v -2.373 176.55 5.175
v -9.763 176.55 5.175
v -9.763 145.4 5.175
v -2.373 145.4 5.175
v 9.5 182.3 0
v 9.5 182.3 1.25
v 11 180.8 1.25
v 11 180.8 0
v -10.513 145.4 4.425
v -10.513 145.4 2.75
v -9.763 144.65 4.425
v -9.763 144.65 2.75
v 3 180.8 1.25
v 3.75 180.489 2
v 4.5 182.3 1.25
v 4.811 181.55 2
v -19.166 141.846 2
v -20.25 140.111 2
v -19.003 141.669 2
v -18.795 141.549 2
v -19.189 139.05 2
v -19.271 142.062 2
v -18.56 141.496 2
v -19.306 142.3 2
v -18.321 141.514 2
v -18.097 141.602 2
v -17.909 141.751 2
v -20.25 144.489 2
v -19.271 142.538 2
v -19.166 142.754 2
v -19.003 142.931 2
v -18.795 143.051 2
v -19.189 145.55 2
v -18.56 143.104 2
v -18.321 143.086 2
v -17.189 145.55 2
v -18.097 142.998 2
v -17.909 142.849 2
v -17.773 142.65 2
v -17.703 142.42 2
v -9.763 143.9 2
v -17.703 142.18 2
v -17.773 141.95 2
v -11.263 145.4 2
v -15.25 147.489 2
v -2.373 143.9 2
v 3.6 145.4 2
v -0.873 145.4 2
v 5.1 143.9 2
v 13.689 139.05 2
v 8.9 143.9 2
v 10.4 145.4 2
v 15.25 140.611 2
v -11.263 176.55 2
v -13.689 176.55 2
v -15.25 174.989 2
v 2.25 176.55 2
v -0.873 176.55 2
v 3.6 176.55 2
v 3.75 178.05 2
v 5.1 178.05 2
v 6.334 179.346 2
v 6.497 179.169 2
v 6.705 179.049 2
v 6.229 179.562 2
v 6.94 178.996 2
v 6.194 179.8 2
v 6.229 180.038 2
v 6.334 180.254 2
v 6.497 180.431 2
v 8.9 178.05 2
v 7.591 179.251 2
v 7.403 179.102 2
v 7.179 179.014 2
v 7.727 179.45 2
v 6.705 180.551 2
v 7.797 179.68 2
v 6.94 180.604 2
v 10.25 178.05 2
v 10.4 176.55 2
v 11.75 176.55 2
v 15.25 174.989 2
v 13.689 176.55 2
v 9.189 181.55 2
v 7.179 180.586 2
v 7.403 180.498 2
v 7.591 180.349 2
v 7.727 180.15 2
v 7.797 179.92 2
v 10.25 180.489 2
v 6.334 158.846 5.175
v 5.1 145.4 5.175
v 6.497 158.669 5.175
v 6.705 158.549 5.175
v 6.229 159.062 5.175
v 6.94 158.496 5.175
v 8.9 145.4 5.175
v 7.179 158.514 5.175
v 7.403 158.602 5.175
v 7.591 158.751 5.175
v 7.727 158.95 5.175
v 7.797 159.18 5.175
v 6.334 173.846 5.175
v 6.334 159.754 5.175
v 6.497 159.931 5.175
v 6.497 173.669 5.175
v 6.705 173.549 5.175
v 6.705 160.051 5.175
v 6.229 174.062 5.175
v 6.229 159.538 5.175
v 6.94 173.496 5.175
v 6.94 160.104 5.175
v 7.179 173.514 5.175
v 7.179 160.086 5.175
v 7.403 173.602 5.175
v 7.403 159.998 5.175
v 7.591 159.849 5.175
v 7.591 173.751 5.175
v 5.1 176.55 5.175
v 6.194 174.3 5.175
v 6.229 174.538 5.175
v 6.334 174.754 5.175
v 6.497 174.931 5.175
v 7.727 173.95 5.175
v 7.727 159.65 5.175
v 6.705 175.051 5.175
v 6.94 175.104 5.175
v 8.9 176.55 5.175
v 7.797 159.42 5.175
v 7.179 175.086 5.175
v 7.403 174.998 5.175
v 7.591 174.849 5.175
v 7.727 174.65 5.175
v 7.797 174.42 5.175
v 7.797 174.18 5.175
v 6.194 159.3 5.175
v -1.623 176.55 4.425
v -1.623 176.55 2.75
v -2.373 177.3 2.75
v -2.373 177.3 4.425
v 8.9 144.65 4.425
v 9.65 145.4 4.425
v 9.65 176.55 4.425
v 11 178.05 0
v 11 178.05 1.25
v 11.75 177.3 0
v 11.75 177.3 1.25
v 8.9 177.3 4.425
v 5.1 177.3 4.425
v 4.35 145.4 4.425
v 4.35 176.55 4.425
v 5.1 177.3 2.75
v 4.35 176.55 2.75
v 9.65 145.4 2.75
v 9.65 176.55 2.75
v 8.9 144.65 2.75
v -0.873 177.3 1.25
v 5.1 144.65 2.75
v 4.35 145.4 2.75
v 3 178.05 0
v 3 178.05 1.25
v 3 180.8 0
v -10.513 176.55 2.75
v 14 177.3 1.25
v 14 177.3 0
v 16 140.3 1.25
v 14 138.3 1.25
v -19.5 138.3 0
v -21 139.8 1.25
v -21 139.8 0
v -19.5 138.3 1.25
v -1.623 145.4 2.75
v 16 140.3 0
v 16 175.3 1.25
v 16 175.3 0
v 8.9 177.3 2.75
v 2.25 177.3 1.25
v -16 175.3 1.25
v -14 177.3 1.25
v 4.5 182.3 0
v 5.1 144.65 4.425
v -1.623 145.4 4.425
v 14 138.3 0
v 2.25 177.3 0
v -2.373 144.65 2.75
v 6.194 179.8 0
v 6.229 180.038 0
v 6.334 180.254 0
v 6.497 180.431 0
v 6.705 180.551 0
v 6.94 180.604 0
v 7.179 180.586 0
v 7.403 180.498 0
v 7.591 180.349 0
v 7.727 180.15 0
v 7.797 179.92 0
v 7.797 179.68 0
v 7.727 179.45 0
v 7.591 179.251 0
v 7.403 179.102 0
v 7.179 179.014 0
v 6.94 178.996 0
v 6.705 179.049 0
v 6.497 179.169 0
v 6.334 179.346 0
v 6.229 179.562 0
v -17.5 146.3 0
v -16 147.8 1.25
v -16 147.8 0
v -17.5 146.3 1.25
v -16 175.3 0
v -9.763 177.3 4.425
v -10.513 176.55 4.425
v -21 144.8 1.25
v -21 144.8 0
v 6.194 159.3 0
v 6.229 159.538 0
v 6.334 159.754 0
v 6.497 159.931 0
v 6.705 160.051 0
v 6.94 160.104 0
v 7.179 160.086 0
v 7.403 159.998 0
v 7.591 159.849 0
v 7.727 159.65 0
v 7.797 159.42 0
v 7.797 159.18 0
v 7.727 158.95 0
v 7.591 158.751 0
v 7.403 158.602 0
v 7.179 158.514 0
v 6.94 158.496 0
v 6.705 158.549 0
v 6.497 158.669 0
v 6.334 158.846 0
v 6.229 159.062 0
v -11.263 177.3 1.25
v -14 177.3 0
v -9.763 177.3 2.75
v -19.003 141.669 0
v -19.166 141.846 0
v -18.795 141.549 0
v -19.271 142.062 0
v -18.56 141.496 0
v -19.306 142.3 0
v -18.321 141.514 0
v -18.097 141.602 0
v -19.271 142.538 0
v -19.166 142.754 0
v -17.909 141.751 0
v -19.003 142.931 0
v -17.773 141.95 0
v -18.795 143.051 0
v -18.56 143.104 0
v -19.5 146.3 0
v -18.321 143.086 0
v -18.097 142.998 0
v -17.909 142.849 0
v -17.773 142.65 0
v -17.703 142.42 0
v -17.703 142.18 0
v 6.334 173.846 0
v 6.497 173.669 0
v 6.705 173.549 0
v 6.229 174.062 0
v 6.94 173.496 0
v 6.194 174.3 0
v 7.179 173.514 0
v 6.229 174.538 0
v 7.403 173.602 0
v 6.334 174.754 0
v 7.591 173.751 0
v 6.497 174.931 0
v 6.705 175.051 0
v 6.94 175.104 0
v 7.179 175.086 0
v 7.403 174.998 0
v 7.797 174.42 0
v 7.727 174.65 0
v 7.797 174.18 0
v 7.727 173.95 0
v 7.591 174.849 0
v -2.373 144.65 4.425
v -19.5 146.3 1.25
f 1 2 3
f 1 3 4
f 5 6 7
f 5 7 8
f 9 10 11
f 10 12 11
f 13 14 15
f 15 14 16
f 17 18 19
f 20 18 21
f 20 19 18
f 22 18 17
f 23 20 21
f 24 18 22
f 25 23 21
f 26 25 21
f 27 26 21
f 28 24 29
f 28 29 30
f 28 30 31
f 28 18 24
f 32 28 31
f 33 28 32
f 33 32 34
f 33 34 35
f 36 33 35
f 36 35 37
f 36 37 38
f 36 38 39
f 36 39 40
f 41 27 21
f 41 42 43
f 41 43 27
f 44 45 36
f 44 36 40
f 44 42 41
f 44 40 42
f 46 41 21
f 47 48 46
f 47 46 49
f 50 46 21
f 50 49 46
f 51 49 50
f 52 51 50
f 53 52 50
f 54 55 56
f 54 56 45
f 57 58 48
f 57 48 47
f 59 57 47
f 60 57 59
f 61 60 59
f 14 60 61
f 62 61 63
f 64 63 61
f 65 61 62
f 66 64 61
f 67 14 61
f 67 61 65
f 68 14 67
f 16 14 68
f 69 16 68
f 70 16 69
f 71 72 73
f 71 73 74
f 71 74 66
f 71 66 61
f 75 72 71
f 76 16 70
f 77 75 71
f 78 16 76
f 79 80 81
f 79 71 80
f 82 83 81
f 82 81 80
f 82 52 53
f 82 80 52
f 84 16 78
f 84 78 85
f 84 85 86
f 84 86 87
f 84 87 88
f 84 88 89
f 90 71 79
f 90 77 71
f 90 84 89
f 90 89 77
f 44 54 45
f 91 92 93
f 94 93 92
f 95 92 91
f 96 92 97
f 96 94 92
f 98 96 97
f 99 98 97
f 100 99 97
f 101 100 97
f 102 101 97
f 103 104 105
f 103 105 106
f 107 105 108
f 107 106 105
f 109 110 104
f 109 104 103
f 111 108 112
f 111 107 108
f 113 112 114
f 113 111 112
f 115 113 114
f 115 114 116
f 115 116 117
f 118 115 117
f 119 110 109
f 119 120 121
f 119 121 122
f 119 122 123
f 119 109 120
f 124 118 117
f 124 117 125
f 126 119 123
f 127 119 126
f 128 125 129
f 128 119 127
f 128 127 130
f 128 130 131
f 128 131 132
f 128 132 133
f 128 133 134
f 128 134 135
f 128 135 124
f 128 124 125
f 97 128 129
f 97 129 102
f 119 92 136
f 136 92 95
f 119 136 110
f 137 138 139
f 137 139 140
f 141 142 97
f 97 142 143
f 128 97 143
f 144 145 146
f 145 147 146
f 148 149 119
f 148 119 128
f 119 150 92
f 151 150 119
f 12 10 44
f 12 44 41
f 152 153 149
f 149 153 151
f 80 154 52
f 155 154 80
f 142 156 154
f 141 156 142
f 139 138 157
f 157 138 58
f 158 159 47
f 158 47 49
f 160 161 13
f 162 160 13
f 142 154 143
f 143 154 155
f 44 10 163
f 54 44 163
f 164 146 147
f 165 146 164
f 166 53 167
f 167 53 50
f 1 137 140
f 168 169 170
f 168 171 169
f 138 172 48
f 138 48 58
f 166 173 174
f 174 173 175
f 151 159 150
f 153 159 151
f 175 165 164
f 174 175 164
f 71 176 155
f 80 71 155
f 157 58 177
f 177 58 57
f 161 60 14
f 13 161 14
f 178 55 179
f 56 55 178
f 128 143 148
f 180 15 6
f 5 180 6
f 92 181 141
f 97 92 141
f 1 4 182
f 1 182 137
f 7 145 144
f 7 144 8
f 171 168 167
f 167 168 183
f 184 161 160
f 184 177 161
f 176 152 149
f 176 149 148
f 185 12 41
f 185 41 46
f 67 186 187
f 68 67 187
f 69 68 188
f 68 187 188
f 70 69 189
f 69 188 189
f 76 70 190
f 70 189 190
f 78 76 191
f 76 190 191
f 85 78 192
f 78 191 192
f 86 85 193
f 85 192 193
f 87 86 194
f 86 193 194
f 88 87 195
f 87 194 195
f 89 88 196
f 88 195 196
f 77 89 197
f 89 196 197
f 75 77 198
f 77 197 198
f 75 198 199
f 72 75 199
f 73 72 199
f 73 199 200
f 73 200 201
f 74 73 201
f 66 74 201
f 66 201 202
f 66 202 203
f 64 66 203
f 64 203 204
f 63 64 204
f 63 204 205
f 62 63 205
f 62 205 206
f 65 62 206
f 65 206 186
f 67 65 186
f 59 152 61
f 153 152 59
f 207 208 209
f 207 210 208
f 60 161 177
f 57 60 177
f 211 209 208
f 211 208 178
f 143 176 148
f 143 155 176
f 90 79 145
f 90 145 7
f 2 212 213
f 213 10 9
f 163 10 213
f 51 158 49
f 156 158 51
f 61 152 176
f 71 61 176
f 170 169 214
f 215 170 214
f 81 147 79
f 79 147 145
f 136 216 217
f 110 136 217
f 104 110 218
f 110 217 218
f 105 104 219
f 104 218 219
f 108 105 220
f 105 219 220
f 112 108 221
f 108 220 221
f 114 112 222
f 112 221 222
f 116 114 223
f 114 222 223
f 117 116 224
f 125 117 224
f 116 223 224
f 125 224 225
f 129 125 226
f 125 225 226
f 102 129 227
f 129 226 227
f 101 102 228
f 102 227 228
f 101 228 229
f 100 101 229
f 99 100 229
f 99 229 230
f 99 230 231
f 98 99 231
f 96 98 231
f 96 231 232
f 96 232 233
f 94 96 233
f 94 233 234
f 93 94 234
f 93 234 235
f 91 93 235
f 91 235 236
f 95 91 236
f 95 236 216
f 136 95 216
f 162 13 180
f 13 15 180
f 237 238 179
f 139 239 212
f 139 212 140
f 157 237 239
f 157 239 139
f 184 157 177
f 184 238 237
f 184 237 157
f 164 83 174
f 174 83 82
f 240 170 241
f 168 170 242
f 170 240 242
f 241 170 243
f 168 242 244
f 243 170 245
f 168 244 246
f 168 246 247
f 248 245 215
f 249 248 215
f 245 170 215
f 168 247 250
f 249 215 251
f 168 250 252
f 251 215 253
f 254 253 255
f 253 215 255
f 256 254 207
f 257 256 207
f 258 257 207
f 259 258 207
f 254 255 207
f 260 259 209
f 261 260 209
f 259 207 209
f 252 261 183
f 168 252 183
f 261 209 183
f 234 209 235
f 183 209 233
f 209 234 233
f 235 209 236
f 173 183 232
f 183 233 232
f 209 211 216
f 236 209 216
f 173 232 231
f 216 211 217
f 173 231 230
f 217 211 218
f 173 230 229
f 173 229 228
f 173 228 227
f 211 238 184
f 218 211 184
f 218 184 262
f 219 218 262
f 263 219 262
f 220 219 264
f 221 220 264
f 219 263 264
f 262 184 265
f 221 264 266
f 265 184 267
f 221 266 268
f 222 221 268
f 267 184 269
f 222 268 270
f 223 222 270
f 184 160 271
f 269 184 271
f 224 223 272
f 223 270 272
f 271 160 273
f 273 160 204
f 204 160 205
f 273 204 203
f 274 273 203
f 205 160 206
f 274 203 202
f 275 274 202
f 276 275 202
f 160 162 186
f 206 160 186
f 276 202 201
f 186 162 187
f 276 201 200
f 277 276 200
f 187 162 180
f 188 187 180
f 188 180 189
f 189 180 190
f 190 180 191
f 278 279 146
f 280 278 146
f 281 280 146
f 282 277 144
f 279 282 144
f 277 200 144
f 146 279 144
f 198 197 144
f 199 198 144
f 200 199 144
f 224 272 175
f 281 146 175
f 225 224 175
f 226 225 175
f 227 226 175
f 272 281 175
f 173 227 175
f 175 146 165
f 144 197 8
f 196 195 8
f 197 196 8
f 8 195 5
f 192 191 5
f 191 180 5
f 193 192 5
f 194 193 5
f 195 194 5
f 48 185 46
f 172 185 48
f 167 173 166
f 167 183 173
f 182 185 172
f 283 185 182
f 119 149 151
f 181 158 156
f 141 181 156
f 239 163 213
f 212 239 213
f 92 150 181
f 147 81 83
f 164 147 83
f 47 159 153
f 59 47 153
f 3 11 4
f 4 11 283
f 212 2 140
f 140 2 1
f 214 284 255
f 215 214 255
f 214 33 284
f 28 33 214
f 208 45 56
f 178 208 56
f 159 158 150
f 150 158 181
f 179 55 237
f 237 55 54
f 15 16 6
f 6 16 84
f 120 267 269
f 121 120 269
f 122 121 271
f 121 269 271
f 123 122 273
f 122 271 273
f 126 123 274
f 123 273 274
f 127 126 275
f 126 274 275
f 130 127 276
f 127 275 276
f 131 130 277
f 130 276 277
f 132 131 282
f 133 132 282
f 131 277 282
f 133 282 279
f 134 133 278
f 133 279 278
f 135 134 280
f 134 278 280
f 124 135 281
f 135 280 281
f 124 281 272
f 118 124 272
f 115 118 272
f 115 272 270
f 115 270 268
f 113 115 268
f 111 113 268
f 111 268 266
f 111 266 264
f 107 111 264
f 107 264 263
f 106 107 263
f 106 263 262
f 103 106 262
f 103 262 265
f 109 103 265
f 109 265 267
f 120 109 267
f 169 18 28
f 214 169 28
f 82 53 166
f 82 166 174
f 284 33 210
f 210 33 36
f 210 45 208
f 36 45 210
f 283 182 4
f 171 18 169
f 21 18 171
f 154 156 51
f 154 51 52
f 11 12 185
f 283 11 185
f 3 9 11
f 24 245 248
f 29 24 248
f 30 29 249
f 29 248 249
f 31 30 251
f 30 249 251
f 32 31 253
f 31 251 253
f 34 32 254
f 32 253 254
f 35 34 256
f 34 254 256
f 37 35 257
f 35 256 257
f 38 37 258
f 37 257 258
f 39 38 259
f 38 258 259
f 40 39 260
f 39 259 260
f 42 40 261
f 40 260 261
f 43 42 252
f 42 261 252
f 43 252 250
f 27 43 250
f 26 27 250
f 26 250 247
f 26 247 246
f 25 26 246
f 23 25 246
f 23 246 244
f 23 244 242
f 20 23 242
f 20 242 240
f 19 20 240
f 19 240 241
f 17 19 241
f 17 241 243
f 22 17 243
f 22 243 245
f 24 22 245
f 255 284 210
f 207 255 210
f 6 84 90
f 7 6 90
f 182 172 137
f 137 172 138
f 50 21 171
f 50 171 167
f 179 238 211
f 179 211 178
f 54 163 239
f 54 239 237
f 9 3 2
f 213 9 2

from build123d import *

# Parameters (mm, degrees)
SKETCH1_W                    = 32
SKETCH1_H                    = 39
BOSS_EXTRUDE1_DEPTH          = 2
SKETCH2_W                    = 5.3
SKETCH2_H                    = 32.65
SKETCH2_W_2                  = 8.89
BOSS_EXTRUDE2_DEPTH          = 3.175
SKETCH10_W                   = 8
SKETCH10_H                   = 5
SKETCH10_W_2                 = 5
SKETCH10_H_2                 = 8
BOSS_EXTRUDE3_DEPTH          = 2
F_52_0_0635_DIAMETER_HOLE1_D = 1.6129
CHAMFER1_SIZE                = 2
CHAMFER3_SIZE                = 1.5
CHAMFER2_SIZE                = 0.75


with BuildPart() as part:
    # Sketch1 → Boss-Extrude1 (new body)
    with BuildSketch(Plane.XY):
        with Locations((0, 157.8)):
            Rectangle(SKETCH1_W, SKETCH1_H)
    extrude(amount=BOSS_EXTRUDE1_DEPTH)

    # Sketch2 → Boss-Extrude2 (add)
    with BuildSketch(Plane.XY.offset(2)):
        with Locations((7, 160.975)):
            Rectangle(SKETCH2_W, SKETCH2_H)
        with Locations((-6.068, 160.975)):
            Rectangle(SKETCH2_W_2, SKETCH2_H)
    extrude(amount=BOSS_EXTRUDE2_DEPTH)

    # Sketch10 → Boss-Extrude3 (add)
    with BuildSketch(Plane.XY.offset(2)):
        with Locations((7, 179.8)):
            Rectangle(SKETCH10_W, SKETCH10_H)
        with Locations((-18.5, 142.3)):
            Rectangle(SKETCH10_W_2, SKETCH10_H_2)
    extrude(amount=-BOSS_EXTRUDE3_DEPTH)

    # #52 (0.0635) Diameter Hole1 (through all)
    with Locations(Plane.XY.offset(5.175)):
        with Locations((7, 174.3), (7, 159.3), (-18.5, 142.3), (7, 179.8)):
            Hole(F_52_0_0635_DIAMETER_HOLE1_D / 2)

    # Chamfer1
    chamfer1_edges = [part.edges().sort_by_distance(p)[0] for p in [
        (16, 177.3, 1),
        (16, 138.3, 1),
        (-16, 177.3, 1),
    ]]
    chamfer(chamfer1_edges, length=CHAMFER1_SIZE)

    # Chamfer3
    chamfer3_edges = [part.edges().sort_by_distance(p)[0] for p in [
        (11, 182.3, 1),
        (3, 182.3, 1),
        (-21, 146.3, 1),
        (-21, 138.3, 1),
        (-16, 146.3, 1),
    ]]
    chamfer(chamfer3_edges, length=CHAMFER3_SIZE)

    # Chamfer2
    chamfer2_edges = [part.edges().sort_by_distance(p)[0] for p in [
        (-21, 142.3, 2),
        (7, 182.3, 2),
        (3, 179.05, 2),
        (-18.5, 146.3, 2),
        (-2.75, 138.3, 2),
        (3.75, 181.55, 2),
        (10.25, 181.55, 2),
        (-20.25, 145.55, 2),
        (-20.25, 139.05, 2),
        (-16.75, 147.05, 2),
        (9.65, 160.975, 2),
        (9.65, 144.65, 3.5875),
        (9.65, 177.3, 3.5875),
        (4.35, 160.975, 2),
        (4.35, 177.3, 3.5875),
        (7, 144.65, 2),
        (4.35, 144.65, 3.5875),
        (9.65, 160.975, 5.175),
        (7, 177.3, 5.175),
        (4.35, 160.975, 5.175),
        (7, 144.65, 5.175),
        (-12.2565, 177.3, 2),
        (-1.623, 160.975, 2),
        (-1.623, 144.65, 3.5875),
        (-1.623, 177.3, 3.5875),
        (-10.513, 160.975, 2),
        (-10.513, 177.3, 3.5875),
        (-6.068, 144.65, 2),
        (-10.513, 144.65, 3.5875),
        (-1.623, 160.975, 5.175),
        (-6.068, 177.3, 5.175),
        (-10.513, 160.975, 5.175),
        (-6.068, 144.65, 5.175),
        (0.6885, 177.3, 2),
        (7, 177.3, 2),
        (11, 179.05, 2),
        (11, 177.3, 1),
        (3, 177.3, 1),
        (12.5, 177.3, 2),
        (16, 157.8, 2),
        (-16, 161.55, 2),
        (-15, 176.3, 2),
        (15, 139.3, 2),
        (15, 176.3, 2),
    ]]
    chamfer(chamfer2_edges, length=CHAMFER2_SIZE)


solid = part.part
